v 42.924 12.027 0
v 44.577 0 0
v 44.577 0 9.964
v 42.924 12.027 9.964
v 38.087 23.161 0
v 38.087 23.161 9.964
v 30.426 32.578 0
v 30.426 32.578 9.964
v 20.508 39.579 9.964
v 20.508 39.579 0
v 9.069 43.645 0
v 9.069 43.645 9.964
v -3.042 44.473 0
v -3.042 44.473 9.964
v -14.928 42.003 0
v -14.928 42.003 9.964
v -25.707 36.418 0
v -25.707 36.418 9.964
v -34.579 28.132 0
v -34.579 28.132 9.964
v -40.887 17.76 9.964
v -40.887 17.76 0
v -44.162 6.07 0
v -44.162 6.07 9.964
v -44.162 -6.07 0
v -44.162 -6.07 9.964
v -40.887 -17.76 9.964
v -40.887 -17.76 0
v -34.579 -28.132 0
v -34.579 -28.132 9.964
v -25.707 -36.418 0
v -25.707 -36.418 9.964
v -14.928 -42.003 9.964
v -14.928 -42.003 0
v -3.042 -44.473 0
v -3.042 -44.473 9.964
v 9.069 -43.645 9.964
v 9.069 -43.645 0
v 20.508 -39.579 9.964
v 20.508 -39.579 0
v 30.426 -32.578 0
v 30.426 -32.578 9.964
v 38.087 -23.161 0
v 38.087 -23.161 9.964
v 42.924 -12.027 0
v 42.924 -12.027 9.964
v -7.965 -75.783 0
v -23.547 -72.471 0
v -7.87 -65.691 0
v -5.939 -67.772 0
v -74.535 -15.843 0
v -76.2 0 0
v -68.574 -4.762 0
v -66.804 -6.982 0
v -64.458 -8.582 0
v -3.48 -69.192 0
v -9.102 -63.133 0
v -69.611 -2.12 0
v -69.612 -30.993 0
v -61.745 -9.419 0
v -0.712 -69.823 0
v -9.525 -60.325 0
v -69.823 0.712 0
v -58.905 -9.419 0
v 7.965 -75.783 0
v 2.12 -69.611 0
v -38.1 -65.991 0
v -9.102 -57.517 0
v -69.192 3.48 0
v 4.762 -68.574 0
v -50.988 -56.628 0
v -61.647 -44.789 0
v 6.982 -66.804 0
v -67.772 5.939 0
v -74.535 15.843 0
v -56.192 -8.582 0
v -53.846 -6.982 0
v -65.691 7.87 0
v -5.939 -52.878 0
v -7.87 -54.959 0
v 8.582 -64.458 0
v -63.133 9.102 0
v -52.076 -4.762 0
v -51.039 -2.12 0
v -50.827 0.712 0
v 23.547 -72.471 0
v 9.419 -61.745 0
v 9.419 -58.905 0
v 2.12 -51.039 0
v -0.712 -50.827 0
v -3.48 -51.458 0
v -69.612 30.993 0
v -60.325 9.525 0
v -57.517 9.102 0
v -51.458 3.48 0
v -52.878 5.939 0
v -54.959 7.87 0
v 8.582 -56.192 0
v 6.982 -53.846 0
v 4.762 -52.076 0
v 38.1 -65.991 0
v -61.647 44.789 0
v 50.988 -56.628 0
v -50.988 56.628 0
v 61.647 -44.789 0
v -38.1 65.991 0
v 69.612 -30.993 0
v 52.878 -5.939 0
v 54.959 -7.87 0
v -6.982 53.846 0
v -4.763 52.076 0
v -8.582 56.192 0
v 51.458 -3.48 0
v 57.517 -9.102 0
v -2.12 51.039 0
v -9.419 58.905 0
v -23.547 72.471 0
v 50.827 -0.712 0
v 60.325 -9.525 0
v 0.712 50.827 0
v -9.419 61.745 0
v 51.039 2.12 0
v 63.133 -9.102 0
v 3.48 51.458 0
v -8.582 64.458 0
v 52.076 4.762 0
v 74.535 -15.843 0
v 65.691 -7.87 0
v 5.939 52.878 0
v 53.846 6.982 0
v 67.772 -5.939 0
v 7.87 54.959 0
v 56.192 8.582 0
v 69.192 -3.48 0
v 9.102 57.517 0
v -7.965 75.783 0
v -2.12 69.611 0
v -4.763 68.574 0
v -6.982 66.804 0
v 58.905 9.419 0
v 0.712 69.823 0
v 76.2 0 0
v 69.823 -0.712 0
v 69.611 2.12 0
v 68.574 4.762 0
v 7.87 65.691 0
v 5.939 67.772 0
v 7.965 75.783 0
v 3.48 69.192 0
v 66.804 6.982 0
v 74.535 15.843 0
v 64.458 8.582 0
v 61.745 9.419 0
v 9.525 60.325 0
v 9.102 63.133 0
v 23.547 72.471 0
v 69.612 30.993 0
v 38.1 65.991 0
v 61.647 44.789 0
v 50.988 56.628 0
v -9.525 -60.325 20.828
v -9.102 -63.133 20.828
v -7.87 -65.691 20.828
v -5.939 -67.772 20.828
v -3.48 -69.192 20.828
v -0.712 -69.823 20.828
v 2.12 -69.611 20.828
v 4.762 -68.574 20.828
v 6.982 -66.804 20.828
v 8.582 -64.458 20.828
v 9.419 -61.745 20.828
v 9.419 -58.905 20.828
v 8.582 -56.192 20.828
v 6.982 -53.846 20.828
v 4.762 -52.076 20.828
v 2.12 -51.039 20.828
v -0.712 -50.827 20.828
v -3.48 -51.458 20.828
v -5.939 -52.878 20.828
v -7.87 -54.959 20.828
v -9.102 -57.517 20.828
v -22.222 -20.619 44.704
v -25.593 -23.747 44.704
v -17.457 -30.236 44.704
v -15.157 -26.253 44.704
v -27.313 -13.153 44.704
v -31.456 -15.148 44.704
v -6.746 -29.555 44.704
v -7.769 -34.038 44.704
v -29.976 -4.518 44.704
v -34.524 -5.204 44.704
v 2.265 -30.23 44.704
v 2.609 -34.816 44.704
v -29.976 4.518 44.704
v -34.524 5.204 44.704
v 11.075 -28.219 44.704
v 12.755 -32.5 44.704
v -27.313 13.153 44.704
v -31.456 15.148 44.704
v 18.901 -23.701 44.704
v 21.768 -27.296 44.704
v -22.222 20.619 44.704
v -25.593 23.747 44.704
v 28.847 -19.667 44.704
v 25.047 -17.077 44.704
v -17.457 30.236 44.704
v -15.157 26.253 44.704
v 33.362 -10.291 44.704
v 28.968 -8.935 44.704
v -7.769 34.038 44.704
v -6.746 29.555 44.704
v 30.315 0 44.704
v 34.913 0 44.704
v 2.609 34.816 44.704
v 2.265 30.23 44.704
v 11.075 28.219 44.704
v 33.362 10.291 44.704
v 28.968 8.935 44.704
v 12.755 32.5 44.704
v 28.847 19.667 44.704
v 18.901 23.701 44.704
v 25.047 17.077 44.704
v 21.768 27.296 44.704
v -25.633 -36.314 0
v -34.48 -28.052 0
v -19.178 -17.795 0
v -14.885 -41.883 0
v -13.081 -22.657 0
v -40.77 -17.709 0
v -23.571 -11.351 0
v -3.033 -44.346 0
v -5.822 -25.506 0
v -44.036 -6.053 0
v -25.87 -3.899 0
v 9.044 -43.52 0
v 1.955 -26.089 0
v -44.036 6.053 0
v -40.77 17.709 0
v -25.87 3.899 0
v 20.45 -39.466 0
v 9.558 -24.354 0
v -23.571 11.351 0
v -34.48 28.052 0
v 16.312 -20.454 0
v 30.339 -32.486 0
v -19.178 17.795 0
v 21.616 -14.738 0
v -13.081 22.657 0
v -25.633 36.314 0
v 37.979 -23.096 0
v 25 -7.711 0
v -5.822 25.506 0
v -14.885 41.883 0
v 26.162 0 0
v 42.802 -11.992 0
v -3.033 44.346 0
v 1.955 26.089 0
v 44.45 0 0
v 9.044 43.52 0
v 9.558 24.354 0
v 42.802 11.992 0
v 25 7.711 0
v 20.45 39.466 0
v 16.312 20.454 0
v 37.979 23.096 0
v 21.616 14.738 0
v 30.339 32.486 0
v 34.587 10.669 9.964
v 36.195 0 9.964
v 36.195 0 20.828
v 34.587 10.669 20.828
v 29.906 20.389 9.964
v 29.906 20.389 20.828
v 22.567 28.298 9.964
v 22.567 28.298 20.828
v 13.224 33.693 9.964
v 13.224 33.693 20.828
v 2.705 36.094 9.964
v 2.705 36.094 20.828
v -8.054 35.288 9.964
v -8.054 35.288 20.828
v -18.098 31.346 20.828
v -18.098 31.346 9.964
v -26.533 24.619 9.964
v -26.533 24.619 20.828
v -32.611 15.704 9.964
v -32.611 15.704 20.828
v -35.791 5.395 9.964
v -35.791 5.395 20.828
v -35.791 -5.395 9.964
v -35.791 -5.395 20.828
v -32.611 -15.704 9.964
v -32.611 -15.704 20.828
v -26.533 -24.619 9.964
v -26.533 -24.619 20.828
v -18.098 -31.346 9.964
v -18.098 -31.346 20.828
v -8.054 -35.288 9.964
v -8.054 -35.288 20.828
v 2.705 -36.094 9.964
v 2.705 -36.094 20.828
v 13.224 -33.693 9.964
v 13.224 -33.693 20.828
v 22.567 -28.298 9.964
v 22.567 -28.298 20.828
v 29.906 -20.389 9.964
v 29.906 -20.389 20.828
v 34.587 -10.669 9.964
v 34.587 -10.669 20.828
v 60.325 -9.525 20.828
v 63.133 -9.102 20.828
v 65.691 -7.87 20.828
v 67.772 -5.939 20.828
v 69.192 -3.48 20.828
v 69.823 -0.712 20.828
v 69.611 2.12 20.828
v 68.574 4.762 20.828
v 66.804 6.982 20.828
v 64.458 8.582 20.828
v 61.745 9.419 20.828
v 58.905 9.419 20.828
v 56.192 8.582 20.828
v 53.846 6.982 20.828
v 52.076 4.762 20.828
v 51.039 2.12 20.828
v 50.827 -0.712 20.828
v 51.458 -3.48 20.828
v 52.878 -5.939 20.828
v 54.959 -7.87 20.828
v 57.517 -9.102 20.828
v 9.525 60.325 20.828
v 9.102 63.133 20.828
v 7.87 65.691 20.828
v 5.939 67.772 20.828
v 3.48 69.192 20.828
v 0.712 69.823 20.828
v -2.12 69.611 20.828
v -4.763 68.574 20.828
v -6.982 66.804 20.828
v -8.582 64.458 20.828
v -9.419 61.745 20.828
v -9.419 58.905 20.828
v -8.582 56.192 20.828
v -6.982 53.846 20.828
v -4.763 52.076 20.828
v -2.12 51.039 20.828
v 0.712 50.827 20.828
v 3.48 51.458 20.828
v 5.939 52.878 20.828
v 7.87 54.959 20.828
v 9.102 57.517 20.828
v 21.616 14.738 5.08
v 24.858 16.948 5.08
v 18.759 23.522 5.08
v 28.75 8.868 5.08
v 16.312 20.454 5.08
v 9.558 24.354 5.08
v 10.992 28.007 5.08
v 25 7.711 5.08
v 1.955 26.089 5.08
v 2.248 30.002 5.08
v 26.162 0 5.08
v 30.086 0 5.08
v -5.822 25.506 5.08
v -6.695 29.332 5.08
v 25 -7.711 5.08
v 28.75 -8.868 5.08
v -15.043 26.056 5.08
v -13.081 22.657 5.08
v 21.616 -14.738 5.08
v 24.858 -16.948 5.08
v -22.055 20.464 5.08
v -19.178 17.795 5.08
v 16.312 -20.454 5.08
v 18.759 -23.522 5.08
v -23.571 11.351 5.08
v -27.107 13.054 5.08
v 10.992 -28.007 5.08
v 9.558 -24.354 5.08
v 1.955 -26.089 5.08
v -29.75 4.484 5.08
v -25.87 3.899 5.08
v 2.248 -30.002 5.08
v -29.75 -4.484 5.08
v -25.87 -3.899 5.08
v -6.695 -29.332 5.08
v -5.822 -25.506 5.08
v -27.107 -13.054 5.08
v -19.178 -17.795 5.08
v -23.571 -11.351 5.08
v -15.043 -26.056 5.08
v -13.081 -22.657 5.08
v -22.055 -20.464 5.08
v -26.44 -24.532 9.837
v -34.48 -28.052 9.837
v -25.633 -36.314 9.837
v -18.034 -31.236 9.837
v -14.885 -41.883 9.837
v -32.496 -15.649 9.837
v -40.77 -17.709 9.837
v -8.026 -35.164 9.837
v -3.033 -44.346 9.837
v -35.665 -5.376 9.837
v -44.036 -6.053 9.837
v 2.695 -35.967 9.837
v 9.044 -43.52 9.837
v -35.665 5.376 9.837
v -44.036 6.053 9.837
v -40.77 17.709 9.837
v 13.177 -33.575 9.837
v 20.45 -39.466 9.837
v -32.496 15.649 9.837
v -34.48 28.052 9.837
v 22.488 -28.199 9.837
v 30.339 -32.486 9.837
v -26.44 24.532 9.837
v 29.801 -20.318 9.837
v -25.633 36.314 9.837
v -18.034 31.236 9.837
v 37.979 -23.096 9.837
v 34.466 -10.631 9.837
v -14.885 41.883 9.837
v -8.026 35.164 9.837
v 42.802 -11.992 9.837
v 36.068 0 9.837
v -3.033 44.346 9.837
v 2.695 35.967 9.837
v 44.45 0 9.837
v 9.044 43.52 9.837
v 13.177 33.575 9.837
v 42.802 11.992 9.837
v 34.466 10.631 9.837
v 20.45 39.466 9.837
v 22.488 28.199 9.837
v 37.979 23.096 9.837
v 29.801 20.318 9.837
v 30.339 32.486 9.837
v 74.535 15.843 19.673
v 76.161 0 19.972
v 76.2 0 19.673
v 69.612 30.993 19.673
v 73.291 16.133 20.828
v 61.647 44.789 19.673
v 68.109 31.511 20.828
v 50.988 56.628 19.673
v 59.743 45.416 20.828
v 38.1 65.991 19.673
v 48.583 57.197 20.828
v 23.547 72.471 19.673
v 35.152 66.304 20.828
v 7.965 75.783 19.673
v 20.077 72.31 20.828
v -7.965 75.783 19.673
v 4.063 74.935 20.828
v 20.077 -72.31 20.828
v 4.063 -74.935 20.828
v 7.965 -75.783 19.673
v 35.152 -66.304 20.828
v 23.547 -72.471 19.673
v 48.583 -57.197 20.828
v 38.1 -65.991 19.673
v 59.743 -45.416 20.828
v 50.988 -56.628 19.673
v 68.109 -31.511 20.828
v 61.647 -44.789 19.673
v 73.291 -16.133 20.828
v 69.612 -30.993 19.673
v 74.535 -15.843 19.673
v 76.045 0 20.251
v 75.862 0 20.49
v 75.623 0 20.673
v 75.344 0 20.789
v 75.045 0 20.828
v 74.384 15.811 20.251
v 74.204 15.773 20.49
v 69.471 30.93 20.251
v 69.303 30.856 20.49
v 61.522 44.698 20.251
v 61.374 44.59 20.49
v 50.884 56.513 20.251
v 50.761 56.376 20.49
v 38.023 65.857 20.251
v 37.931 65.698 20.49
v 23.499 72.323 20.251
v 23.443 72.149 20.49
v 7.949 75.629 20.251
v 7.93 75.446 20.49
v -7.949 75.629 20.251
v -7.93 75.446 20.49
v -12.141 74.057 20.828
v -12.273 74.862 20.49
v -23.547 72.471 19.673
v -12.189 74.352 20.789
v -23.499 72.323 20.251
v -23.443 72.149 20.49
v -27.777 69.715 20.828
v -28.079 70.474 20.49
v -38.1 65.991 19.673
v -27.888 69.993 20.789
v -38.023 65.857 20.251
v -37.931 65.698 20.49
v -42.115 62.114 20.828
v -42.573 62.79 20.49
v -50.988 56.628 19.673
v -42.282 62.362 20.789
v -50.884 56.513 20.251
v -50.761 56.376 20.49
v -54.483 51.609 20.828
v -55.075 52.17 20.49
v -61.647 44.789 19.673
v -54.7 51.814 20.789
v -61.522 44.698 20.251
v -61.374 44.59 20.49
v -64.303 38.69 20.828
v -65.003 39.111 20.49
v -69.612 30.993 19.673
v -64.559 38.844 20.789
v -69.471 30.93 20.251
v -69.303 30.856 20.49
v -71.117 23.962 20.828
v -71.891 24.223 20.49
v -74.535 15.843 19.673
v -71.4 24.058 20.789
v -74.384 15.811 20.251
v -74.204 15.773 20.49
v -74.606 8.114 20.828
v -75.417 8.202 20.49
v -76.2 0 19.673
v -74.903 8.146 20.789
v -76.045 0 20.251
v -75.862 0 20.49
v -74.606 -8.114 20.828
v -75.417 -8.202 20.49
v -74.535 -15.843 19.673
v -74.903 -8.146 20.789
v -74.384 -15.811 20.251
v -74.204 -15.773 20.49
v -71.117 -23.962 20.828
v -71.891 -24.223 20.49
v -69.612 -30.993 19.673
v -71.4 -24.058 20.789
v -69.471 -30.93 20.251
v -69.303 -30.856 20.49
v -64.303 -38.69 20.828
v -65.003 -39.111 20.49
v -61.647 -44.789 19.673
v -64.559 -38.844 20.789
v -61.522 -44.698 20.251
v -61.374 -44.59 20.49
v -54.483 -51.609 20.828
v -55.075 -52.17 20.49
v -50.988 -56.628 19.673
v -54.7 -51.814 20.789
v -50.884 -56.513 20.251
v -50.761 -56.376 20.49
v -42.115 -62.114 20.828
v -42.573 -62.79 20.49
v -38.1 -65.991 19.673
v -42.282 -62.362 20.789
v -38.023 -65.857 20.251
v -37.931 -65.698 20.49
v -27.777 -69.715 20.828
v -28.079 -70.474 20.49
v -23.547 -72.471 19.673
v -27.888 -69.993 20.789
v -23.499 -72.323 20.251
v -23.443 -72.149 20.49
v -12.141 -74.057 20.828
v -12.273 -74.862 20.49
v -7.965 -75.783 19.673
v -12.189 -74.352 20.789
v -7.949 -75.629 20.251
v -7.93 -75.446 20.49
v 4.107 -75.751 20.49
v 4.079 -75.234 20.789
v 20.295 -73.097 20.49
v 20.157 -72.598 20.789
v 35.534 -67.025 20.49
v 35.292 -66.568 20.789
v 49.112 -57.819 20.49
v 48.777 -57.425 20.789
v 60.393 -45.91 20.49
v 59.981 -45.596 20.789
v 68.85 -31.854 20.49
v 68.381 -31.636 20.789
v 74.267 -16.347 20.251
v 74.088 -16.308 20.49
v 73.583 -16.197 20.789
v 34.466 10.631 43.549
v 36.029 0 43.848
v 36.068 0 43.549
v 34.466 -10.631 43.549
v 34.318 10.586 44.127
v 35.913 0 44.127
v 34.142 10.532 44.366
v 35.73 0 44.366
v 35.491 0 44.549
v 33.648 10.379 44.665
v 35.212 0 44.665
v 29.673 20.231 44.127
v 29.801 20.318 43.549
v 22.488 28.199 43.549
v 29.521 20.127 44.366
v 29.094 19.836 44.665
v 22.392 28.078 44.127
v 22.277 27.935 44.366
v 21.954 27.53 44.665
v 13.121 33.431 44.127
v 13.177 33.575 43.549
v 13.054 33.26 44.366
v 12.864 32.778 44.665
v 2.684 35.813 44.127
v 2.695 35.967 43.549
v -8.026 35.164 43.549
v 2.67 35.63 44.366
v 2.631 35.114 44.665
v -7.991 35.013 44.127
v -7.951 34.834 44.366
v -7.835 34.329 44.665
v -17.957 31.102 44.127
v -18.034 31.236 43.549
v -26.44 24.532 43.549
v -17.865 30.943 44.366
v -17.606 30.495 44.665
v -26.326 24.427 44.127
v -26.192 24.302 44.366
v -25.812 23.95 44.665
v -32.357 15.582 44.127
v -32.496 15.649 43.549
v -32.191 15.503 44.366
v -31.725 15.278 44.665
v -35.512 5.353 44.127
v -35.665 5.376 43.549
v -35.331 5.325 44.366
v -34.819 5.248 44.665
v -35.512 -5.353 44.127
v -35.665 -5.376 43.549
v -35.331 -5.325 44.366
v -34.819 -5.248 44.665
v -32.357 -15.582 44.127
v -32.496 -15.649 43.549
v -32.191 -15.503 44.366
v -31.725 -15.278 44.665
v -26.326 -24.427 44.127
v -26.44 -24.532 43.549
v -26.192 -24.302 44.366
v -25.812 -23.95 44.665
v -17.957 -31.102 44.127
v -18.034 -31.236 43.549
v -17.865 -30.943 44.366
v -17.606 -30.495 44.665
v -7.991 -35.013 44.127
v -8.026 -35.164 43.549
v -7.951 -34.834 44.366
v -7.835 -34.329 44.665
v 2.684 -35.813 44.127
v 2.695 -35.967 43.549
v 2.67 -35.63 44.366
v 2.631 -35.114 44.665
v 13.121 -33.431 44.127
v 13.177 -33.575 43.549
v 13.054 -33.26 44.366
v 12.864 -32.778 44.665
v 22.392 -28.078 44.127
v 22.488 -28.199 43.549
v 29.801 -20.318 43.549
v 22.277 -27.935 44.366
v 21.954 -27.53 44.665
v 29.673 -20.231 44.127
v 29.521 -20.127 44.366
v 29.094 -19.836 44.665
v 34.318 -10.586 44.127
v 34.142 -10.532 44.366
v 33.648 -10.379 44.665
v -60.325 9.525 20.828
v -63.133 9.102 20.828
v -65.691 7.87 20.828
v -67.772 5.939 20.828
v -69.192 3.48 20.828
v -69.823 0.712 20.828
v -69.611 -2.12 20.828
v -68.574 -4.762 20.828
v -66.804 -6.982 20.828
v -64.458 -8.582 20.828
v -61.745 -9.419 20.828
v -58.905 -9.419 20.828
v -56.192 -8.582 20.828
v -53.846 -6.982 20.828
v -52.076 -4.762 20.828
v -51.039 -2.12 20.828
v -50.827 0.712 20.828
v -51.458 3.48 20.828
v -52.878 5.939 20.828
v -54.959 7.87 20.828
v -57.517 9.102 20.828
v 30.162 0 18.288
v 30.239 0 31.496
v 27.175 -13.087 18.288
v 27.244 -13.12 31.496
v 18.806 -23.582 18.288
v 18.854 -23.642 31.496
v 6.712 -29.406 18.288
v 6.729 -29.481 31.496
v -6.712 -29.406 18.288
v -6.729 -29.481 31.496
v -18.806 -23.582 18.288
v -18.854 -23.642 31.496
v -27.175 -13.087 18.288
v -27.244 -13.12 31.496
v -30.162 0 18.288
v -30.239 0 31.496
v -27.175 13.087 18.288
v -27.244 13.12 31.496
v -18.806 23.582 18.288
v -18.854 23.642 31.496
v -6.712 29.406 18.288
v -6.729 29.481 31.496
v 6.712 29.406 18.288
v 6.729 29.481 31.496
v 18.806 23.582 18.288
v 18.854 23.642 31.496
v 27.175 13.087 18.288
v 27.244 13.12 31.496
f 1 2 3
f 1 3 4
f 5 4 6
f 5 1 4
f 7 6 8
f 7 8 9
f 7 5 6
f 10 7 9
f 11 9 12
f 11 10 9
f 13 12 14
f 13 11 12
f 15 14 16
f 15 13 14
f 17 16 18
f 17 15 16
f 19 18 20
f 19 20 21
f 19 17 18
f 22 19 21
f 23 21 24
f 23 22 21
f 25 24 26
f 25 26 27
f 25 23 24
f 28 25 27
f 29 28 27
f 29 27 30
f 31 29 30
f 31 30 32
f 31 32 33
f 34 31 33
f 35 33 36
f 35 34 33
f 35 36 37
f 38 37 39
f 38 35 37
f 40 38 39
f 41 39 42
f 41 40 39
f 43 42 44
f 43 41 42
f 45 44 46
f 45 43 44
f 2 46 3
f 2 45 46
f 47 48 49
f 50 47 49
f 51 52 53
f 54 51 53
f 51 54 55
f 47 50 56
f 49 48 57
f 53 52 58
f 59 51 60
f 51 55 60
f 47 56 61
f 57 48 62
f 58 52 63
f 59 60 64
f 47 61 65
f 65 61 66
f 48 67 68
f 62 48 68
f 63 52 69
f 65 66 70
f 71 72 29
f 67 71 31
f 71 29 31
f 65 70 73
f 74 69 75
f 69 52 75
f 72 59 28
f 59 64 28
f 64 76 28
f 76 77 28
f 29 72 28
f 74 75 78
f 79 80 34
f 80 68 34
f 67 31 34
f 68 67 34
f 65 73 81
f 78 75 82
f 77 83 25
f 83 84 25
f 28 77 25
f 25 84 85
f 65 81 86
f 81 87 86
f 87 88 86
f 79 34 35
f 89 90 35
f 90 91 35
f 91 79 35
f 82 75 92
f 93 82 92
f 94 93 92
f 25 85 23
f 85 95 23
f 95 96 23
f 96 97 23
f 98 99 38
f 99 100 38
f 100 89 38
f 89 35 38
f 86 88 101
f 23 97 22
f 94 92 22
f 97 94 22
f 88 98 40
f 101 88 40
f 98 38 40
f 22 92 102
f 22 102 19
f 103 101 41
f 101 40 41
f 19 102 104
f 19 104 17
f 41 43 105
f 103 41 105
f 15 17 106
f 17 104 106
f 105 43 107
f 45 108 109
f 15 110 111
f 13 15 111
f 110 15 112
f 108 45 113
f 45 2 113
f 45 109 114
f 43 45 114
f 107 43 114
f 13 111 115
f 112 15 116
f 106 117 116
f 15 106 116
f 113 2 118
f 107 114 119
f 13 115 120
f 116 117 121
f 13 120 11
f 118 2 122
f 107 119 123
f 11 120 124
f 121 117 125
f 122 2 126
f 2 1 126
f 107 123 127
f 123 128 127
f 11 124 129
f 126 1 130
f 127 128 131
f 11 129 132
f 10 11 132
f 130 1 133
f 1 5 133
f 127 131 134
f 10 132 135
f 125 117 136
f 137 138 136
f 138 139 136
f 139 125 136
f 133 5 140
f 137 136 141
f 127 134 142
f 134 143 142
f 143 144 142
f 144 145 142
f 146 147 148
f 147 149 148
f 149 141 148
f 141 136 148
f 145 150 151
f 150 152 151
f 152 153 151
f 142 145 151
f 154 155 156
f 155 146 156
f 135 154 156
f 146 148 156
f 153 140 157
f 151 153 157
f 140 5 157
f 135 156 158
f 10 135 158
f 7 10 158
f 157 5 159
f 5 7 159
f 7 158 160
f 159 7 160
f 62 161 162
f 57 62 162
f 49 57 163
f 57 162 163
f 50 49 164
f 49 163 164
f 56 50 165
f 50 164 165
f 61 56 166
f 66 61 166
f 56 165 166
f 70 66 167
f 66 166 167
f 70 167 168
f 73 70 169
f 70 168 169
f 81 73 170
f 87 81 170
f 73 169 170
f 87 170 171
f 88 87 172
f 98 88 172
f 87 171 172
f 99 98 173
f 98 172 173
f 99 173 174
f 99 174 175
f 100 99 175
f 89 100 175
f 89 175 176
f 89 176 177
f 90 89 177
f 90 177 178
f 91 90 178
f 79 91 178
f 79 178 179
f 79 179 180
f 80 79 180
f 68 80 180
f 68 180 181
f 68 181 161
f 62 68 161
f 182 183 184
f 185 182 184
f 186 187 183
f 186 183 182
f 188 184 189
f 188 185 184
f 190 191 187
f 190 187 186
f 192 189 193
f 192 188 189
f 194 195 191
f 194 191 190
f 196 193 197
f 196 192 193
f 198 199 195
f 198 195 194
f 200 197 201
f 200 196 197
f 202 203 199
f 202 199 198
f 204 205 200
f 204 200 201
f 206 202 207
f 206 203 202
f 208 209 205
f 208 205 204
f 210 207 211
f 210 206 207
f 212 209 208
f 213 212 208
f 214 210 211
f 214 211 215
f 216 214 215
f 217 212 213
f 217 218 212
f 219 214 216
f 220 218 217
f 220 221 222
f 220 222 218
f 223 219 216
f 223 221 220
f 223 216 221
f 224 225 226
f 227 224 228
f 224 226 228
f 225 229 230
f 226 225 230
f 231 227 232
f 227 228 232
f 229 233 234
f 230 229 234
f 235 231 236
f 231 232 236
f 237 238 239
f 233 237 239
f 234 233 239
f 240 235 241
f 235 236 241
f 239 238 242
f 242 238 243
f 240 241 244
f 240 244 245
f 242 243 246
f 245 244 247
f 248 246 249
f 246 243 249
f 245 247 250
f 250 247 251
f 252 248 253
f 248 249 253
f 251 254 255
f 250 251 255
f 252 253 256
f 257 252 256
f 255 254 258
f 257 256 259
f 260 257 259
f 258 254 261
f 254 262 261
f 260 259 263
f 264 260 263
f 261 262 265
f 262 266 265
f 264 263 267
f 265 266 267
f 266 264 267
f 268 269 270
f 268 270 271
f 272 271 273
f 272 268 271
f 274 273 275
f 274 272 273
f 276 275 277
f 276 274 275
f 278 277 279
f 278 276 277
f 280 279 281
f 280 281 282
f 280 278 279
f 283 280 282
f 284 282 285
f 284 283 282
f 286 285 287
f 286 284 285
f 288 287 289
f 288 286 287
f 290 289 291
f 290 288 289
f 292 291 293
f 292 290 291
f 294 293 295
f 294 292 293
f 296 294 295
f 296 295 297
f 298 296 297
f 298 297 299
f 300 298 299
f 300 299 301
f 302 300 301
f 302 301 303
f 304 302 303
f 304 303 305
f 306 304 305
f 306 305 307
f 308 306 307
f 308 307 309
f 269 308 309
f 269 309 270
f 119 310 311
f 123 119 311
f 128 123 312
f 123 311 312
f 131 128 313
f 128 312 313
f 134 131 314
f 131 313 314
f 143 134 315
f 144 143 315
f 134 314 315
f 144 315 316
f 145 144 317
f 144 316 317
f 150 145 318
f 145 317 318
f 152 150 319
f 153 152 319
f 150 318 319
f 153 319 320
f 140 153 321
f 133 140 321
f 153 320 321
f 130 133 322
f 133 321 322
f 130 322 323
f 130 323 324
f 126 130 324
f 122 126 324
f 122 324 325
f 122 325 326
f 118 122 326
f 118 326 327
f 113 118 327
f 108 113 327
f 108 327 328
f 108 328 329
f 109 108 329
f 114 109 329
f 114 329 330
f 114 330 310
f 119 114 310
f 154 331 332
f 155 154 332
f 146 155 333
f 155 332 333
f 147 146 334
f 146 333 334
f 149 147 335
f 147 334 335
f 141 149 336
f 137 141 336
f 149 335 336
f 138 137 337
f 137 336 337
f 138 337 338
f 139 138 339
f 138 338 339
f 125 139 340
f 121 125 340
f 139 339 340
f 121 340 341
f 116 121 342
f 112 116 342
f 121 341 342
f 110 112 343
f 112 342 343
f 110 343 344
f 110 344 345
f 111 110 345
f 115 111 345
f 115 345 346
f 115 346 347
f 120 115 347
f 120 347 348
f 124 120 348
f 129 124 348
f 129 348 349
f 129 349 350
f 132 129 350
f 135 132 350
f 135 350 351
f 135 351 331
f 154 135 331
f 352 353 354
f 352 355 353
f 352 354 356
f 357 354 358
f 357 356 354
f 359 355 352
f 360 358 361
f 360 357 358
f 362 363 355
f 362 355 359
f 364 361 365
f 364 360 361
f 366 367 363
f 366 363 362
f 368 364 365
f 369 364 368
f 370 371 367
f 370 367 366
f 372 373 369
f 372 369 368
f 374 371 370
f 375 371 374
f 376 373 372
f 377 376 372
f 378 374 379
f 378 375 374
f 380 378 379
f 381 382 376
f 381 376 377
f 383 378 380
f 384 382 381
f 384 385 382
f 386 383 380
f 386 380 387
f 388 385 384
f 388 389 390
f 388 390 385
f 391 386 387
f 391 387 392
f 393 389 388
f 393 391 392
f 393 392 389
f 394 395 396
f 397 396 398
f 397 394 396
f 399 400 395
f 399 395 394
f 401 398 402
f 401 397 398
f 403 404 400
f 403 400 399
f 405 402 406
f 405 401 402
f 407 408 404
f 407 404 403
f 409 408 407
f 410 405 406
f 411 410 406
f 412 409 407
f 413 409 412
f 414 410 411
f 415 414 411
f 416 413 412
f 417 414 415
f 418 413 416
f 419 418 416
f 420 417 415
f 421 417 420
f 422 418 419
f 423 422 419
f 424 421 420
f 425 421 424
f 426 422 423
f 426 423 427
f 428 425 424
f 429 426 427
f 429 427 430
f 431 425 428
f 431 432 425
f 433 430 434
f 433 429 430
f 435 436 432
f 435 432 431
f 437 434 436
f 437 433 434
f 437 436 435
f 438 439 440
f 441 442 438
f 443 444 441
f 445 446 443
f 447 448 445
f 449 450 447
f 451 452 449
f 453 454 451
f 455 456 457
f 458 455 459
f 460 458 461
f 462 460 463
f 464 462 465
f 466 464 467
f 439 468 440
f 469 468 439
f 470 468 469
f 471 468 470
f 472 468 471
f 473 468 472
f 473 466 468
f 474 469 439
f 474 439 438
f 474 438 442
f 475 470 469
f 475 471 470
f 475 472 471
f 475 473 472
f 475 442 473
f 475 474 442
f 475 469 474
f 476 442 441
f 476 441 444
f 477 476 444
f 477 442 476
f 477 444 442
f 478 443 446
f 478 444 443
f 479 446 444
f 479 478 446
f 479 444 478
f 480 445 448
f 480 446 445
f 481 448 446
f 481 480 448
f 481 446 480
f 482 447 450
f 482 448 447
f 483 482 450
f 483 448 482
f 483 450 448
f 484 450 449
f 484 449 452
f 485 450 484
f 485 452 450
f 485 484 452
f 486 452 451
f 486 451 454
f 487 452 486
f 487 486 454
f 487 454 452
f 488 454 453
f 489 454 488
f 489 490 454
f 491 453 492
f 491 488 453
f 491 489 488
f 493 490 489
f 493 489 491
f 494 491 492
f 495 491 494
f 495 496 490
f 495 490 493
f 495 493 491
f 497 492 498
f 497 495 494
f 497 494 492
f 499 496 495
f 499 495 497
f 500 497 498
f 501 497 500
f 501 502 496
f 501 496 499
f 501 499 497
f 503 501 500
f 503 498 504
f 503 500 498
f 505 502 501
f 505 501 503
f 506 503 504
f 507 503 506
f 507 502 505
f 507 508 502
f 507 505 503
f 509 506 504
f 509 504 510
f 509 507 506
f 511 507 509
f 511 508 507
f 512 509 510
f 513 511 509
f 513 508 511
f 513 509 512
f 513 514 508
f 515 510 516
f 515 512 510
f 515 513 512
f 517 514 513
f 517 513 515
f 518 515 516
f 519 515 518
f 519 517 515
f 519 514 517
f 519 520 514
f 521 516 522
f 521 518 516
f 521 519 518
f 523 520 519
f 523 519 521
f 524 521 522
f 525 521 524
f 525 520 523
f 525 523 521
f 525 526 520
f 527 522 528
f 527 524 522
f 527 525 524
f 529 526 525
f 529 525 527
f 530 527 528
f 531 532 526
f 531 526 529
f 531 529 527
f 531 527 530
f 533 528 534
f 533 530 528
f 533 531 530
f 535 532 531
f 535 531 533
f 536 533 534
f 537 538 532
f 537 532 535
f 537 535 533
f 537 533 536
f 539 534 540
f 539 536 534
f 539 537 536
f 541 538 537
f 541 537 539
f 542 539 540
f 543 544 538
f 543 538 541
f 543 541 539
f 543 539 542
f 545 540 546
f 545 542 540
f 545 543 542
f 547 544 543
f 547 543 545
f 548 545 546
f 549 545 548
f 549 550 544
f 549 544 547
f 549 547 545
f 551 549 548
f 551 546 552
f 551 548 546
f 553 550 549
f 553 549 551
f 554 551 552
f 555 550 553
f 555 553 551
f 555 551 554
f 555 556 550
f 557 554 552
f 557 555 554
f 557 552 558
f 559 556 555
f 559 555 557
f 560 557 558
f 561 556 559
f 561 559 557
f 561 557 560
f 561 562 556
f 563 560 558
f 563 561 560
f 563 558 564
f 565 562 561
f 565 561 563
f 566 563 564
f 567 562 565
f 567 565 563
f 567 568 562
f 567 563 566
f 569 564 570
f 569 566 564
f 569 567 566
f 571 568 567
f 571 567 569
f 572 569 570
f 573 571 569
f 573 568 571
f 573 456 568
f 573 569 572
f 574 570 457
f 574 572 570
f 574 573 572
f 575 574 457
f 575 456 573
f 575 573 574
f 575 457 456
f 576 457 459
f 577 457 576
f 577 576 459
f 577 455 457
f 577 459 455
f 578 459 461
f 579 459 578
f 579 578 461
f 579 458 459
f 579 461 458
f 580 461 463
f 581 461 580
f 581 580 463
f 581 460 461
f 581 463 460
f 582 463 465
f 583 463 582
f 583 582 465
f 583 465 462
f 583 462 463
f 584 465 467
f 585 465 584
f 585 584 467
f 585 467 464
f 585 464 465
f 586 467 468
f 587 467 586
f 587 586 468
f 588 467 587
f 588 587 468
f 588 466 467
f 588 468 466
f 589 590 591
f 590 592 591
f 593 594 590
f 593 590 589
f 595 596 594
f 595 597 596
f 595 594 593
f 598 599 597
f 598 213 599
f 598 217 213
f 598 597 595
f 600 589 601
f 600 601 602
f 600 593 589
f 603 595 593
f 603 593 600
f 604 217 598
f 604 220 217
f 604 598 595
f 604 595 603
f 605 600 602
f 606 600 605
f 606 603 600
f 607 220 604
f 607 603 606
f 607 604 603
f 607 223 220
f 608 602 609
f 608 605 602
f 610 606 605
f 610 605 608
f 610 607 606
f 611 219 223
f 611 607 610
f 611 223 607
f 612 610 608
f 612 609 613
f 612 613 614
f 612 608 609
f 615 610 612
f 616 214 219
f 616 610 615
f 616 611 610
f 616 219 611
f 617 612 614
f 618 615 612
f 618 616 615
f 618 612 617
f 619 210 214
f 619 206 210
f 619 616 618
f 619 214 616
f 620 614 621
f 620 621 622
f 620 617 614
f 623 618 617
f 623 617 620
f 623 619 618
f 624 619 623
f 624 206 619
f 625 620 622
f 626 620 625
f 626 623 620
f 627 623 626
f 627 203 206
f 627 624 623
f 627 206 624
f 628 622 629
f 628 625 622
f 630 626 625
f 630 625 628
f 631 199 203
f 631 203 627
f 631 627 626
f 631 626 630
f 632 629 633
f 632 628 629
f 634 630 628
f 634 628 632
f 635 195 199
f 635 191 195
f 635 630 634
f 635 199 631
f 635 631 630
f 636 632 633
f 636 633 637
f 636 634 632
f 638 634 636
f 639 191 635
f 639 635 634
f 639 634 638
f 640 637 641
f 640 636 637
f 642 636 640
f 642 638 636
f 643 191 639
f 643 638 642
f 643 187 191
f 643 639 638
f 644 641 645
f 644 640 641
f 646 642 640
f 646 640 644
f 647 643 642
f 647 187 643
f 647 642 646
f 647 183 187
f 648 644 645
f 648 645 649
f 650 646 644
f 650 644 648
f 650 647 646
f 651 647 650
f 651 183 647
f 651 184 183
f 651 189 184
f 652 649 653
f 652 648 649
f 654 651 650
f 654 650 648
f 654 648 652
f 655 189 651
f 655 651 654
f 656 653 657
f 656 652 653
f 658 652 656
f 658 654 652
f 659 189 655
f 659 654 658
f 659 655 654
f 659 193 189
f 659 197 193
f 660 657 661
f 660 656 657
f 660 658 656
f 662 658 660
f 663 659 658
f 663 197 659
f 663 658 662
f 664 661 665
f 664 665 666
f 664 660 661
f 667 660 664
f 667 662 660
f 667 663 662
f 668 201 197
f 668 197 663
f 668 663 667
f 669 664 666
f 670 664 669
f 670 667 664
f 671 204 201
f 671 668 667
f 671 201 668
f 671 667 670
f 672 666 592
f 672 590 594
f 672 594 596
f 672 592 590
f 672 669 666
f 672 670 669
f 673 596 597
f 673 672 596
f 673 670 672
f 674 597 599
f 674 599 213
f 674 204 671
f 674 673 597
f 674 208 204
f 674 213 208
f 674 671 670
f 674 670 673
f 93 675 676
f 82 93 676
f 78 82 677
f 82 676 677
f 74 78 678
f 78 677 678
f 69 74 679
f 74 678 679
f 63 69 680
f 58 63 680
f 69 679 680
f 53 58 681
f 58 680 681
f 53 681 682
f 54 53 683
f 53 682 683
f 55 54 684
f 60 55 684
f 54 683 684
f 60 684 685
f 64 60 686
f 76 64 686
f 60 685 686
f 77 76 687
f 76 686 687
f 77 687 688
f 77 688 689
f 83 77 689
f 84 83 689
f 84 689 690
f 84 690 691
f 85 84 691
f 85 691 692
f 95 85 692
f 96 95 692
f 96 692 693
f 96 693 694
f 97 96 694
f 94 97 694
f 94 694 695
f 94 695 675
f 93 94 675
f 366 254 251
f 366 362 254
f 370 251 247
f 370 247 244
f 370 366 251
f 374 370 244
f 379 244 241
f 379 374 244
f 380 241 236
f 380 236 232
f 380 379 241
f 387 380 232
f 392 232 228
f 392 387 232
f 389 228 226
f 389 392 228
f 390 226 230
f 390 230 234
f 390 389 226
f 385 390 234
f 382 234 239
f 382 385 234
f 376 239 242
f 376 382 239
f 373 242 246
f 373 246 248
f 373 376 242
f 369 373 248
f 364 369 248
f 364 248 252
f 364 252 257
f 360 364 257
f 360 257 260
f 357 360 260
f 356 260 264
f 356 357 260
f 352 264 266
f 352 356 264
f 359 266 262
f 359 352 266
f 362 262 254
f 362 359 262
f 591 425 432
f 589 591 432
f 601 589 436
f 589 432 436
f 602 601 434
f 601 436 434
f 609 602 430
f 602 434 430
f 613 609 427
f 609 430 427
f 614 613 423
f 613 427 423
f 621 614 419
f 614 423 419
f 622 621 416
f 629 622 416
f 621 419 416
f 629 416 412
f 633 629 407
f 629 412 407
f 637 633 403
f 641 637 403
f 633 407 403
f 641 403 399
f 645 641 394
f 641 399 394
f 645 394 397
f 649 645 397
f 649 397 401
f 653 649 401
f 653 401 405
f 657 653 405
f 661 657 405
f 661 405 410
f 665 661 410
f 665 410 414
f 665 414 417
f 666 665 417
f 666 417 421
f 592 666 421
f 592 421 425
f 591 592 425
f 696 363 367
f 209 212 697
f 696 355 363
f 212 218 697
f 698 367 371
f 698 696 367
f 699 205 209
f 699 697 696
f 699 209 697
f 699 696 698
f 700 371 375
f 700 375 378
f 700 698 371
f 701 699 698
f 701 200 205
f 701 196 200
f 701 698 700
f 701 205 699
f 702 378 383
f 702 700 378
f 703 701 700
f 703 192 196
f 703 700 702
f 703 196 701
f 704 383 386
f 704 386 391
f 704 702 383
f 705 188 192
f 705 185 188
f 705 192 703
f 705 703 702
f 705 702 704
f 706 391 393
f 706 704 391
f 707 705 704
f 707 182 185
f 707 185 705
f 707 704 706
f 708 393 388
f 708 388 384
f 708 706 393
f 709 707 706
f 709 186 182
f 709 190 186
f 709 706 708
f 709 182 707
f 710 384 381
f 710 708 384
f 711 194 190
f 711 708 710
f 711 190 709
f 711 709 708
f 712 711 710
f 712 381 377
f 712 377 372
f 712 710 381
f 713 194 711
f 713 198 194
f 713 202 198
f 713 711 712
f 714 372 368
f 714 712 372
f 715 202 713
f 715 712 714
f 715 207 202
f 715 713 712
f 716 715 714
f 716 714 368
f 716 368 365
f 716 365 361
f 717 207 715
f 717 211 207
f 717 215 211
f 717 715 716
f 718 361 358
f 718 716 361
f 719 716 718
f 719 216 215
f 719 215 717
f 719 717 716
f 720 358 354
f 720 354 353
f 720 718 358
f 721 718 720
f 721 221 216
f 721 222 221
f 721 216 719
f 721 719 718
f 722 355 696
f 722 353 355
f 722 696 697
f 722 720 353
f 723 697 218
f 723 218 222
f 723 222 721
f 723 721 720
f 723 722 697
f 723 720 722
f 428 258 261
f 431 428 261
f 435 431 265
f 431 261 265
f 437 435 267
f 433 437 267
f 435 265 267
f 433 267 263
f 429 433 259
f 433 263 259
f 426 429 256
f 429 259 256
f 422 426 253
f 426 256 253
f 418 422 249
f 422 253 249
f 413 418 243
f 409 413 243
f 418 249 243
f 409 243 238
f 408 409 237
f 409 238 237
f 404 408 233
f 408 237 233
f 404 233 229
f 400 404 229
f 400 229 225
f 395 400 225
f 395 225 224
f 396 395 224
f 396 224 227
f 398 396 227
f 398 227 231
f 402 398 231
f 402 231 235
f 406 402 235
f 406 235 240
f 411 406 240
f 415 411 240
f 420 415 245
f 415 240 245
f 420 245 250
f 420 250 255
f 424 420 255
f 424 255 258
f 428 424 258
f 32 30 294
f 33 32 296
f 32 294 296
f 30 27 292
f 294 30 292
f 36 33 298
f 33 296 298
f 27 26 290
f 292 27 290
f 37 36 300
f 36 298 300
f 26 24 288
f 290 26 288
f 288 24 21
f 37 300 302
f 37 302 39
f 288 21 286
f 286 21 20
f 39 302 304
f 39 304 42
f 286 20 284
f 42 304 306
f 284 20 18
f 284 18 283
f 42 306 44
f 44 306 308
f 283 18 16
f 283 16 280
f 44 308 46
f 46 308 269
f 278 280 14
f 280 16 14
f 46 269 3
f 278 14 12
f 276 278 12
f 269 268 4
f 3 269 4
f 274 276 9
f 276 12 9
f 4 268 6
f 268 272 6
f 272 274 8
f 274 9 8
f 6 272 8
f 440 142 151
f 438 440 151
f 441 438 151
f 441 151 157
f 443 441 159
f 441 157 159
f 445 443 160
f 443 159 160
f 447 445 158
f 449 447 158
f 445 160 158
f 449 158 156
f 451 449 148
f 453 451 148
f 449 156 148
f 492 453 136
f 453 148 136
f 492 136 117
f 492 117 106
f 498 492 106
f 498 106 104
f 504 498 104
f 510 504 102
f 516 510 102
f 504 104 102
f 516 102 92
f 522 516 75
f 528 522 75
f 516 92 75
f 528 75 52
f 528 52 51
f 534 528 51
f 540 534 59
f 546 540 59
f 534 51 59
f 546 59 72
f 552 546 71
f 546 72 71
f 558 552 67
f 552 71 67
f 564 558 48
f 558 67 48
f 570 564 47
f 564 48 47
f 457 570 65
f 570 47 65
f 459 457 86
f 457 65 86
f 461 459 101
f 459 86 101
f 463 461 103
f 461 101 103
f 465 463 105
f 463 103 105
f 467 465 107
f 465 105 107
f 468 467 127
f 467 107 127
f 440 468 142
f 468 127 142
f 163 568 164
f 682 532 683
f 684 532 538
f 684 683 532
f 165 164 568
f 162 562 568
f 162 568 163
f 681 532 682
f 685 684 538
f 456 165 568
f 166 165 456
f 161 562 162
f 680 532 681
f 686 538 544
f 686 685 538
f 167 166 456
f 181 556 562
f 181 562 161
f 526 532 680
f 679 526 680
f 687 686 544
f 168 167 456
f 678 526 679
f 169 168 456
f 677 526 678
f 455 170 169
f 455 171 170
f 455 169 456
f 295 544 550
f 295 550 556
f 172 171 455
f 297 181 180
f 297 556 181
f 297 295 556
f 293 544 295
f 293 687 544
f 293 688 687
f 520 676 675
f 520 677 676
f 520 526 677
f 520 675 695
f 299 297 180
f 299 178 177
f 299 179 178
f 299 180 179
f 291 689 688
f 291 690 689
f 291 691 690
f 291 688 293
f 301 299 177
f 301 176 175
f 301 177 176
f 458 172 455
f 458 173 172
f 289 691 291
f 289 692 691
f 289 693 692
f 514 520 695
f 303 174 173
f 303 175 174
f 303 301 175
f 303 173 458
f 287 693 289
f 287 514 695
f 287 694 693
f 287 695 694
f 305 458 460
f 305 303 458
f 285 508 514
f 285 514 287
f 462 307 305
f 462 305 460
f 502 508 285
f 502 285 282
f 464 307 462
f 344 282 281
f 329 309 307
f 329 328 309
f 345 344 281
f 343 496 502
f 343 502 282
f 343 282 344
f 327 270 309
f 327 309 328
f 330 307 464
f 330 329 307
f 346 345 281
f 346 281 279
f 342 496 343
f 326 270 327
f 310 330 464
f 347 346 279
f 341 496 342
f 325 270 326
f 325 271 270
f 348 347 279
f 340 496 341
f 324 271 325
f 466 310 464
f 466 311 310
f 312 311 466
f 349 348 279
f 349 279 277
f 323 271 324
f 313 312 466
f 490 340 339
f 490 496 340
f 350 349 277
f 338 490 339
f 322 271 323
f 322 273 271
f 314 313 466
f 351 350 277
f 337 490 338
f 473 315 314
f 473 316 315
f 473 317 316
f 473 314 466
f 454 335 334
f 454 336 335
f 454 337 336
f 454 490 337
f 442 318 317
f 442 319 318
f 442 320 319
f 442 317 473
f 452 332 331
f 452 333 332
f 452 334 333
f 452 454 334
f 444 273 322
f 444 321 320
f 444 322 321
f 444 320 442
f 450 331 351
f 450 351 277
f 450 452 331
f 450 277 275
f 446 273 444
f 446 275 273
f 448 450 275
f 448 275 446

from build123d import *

# Parameters (mm, degrees)
SKETCH1_R                       = 76.2
EXTRUDE1_DEPTH                  = 20.828
SKETCH2_R                       = 36.068
EXTRUDE2_DEPTH                  = 23.876
SKETCH3_R                       = 9.525
EXTRUDE3_DEPTH                  = 111.376371457
CIRPATTERN1_COUNT               = 4
FILLET1_R                       = 1.154545455
CUT_REVOLVE_THIN1_OUTLINE_R     = 44.577
CUT_REVOLVE_THIN1_OUTLINE_R_2   = 44.45
CUT_REVOLVE_THIN1_DEPTH         = 9.963727273
CUT_REVOLVE_THIN1_START         = 9.836727273
CUT_REVOLVE_THIN1_2_OUTLINE_R   = 36.195
CUT_REVOLVE_THIN1_2_OUTLINE_R_2 = 36.068
CUT_REVOLVE_THIN1_2_DEPTH       = 10.991272727
CUT_REVOLVE_THIN1_3_OUTLINE_R   = 44.45
CUT_REVOLVE_THIN1_3_OUTLINE_R_2 = 36.195
CUT_REVOLVE_THIN1_3_DEPTH       = 0.127


# Read off the part's stored shape, not the designer's step: Cut-Revolve-Thin1
with BuildPart() as part:
    # Sketch1 → Extrude1 (new body)
    with BuildSketch(Plane.XY):
        Circle(SKETCH1_R)
    extrude(amount=EXTRUDE1_DEPTH)

    # Sketch2 → Extrude2 (add)
    with BuildSketch(Plane.XY.offset(20.828)):
        Circle(SKETCH2_R)
    extrude(amount=EXTRUDE2_DEPTH)

    # Sketch3 → Extrude3 (cut, through all)
    with BuildSketch(Plane.XY.offset(20.828)):
        with Locations((0, 60.325)):
            Circle(SKETCH3_R)
    extrude3 = extrude(amount=-EXTRUDE3_DEPTH, mode=Mode.SUBTRACT)

    # CirPattern1: Extrude3 ×4 about axis
    cirpattern1_axis = Axis((0, 0, 0), (0, 0, 1))
    for i in range(1, CIRPATTERN1_COUNT):
        add(extrude3.rotate(cirpattern1_axis, i * 360 / CIRPATTERN1_COUNT), mode=Mode.SUBTRACT)

    # Fillet1
    fillet1_edges = [part.edges().sort_by_distance(p)[0] for p in [
        (-76.2, 0, 20.828),
        (-36.068, 0, 44.704),
    ]]
    fillet(fillet1_edges, radius=FILLET1_R)

    # Sketch4 → Cut-Revolve1 (revolve, cut)
    with BuildSketch(Plane(origin=(0, 0, 62.70625), x_dir=(0, 0, 1), z_dir=(-1, 0, 0)), mode=Mode.PRIVATE) as cut_revolve1_sk:
        Polygon((-62.70625, 26.162), (-57.62625, 26.162), (-57.62625, 30.0863), (-18.00225, 30.3149), (-18.00225, 0), (-62.70625, 0), align=None)
    revolve(cut_revolve1_sk.sketch.rotate(Axis((0, 0, 44.704), (0, 0, -1)), 90), axis=Axis((0, 0, 44.704), (0, 0, -1)), mode=Mode.SUBTRACT)

    # Cut-Revolve-Thin1 outline → Cut-Revolve-Thin1 (cut)
    with BuildSketch(Plane.XY):
        Circle(CUT_REVOLVE_THIN1_OUTLINE_R)
        Circle(CUT_REVOLVE_THIN1_OUTLINE_R_2, mode=Mode.SUBTRACT)
    extrude(amount=CUT_REVOLVE_THIN1_DEPTH, mode=Mode.SUBTRACT)

    # Cut-Revolve-Thin1 2 outline → Cut-Revolve-Thin1 2 (cut)
    with BuildSketch(Plane.XY.offset(CUT_REVOLVE_THIN1_START)):
        Circle(CUT_REVOLVE_THIN1_2_OUTLINE_R)
        Circle(CUT_REVOLVE_THIN1_2_OUTLINE_R_2, mode=Mode.SUBTRACT)
    extrude(amount=CUT_REVOLVE_THIN1_2_DEPTH, mode=Mode.SUBTRACT)

    # Cut-Revolve-Thin1 3 outline → Cut-Revolve-Thin1 3 (cut)
    with BuildSketch(Plane.XY.offset(CUT_REVOLVE_THIN1_START)):
        Circle(CUT_REVOLVE_THIN1_3_OUTLINE_R)
        Circle(CUT_REVOLVE_THIN1_3_OUTLINE_R_2, mode=Mode.SUBTRACT)
    extrude(amount=CUT_REVOLVE_THIN1_3_DEPTH, mode=Mode.SUBTRACT)


solid = part.part
